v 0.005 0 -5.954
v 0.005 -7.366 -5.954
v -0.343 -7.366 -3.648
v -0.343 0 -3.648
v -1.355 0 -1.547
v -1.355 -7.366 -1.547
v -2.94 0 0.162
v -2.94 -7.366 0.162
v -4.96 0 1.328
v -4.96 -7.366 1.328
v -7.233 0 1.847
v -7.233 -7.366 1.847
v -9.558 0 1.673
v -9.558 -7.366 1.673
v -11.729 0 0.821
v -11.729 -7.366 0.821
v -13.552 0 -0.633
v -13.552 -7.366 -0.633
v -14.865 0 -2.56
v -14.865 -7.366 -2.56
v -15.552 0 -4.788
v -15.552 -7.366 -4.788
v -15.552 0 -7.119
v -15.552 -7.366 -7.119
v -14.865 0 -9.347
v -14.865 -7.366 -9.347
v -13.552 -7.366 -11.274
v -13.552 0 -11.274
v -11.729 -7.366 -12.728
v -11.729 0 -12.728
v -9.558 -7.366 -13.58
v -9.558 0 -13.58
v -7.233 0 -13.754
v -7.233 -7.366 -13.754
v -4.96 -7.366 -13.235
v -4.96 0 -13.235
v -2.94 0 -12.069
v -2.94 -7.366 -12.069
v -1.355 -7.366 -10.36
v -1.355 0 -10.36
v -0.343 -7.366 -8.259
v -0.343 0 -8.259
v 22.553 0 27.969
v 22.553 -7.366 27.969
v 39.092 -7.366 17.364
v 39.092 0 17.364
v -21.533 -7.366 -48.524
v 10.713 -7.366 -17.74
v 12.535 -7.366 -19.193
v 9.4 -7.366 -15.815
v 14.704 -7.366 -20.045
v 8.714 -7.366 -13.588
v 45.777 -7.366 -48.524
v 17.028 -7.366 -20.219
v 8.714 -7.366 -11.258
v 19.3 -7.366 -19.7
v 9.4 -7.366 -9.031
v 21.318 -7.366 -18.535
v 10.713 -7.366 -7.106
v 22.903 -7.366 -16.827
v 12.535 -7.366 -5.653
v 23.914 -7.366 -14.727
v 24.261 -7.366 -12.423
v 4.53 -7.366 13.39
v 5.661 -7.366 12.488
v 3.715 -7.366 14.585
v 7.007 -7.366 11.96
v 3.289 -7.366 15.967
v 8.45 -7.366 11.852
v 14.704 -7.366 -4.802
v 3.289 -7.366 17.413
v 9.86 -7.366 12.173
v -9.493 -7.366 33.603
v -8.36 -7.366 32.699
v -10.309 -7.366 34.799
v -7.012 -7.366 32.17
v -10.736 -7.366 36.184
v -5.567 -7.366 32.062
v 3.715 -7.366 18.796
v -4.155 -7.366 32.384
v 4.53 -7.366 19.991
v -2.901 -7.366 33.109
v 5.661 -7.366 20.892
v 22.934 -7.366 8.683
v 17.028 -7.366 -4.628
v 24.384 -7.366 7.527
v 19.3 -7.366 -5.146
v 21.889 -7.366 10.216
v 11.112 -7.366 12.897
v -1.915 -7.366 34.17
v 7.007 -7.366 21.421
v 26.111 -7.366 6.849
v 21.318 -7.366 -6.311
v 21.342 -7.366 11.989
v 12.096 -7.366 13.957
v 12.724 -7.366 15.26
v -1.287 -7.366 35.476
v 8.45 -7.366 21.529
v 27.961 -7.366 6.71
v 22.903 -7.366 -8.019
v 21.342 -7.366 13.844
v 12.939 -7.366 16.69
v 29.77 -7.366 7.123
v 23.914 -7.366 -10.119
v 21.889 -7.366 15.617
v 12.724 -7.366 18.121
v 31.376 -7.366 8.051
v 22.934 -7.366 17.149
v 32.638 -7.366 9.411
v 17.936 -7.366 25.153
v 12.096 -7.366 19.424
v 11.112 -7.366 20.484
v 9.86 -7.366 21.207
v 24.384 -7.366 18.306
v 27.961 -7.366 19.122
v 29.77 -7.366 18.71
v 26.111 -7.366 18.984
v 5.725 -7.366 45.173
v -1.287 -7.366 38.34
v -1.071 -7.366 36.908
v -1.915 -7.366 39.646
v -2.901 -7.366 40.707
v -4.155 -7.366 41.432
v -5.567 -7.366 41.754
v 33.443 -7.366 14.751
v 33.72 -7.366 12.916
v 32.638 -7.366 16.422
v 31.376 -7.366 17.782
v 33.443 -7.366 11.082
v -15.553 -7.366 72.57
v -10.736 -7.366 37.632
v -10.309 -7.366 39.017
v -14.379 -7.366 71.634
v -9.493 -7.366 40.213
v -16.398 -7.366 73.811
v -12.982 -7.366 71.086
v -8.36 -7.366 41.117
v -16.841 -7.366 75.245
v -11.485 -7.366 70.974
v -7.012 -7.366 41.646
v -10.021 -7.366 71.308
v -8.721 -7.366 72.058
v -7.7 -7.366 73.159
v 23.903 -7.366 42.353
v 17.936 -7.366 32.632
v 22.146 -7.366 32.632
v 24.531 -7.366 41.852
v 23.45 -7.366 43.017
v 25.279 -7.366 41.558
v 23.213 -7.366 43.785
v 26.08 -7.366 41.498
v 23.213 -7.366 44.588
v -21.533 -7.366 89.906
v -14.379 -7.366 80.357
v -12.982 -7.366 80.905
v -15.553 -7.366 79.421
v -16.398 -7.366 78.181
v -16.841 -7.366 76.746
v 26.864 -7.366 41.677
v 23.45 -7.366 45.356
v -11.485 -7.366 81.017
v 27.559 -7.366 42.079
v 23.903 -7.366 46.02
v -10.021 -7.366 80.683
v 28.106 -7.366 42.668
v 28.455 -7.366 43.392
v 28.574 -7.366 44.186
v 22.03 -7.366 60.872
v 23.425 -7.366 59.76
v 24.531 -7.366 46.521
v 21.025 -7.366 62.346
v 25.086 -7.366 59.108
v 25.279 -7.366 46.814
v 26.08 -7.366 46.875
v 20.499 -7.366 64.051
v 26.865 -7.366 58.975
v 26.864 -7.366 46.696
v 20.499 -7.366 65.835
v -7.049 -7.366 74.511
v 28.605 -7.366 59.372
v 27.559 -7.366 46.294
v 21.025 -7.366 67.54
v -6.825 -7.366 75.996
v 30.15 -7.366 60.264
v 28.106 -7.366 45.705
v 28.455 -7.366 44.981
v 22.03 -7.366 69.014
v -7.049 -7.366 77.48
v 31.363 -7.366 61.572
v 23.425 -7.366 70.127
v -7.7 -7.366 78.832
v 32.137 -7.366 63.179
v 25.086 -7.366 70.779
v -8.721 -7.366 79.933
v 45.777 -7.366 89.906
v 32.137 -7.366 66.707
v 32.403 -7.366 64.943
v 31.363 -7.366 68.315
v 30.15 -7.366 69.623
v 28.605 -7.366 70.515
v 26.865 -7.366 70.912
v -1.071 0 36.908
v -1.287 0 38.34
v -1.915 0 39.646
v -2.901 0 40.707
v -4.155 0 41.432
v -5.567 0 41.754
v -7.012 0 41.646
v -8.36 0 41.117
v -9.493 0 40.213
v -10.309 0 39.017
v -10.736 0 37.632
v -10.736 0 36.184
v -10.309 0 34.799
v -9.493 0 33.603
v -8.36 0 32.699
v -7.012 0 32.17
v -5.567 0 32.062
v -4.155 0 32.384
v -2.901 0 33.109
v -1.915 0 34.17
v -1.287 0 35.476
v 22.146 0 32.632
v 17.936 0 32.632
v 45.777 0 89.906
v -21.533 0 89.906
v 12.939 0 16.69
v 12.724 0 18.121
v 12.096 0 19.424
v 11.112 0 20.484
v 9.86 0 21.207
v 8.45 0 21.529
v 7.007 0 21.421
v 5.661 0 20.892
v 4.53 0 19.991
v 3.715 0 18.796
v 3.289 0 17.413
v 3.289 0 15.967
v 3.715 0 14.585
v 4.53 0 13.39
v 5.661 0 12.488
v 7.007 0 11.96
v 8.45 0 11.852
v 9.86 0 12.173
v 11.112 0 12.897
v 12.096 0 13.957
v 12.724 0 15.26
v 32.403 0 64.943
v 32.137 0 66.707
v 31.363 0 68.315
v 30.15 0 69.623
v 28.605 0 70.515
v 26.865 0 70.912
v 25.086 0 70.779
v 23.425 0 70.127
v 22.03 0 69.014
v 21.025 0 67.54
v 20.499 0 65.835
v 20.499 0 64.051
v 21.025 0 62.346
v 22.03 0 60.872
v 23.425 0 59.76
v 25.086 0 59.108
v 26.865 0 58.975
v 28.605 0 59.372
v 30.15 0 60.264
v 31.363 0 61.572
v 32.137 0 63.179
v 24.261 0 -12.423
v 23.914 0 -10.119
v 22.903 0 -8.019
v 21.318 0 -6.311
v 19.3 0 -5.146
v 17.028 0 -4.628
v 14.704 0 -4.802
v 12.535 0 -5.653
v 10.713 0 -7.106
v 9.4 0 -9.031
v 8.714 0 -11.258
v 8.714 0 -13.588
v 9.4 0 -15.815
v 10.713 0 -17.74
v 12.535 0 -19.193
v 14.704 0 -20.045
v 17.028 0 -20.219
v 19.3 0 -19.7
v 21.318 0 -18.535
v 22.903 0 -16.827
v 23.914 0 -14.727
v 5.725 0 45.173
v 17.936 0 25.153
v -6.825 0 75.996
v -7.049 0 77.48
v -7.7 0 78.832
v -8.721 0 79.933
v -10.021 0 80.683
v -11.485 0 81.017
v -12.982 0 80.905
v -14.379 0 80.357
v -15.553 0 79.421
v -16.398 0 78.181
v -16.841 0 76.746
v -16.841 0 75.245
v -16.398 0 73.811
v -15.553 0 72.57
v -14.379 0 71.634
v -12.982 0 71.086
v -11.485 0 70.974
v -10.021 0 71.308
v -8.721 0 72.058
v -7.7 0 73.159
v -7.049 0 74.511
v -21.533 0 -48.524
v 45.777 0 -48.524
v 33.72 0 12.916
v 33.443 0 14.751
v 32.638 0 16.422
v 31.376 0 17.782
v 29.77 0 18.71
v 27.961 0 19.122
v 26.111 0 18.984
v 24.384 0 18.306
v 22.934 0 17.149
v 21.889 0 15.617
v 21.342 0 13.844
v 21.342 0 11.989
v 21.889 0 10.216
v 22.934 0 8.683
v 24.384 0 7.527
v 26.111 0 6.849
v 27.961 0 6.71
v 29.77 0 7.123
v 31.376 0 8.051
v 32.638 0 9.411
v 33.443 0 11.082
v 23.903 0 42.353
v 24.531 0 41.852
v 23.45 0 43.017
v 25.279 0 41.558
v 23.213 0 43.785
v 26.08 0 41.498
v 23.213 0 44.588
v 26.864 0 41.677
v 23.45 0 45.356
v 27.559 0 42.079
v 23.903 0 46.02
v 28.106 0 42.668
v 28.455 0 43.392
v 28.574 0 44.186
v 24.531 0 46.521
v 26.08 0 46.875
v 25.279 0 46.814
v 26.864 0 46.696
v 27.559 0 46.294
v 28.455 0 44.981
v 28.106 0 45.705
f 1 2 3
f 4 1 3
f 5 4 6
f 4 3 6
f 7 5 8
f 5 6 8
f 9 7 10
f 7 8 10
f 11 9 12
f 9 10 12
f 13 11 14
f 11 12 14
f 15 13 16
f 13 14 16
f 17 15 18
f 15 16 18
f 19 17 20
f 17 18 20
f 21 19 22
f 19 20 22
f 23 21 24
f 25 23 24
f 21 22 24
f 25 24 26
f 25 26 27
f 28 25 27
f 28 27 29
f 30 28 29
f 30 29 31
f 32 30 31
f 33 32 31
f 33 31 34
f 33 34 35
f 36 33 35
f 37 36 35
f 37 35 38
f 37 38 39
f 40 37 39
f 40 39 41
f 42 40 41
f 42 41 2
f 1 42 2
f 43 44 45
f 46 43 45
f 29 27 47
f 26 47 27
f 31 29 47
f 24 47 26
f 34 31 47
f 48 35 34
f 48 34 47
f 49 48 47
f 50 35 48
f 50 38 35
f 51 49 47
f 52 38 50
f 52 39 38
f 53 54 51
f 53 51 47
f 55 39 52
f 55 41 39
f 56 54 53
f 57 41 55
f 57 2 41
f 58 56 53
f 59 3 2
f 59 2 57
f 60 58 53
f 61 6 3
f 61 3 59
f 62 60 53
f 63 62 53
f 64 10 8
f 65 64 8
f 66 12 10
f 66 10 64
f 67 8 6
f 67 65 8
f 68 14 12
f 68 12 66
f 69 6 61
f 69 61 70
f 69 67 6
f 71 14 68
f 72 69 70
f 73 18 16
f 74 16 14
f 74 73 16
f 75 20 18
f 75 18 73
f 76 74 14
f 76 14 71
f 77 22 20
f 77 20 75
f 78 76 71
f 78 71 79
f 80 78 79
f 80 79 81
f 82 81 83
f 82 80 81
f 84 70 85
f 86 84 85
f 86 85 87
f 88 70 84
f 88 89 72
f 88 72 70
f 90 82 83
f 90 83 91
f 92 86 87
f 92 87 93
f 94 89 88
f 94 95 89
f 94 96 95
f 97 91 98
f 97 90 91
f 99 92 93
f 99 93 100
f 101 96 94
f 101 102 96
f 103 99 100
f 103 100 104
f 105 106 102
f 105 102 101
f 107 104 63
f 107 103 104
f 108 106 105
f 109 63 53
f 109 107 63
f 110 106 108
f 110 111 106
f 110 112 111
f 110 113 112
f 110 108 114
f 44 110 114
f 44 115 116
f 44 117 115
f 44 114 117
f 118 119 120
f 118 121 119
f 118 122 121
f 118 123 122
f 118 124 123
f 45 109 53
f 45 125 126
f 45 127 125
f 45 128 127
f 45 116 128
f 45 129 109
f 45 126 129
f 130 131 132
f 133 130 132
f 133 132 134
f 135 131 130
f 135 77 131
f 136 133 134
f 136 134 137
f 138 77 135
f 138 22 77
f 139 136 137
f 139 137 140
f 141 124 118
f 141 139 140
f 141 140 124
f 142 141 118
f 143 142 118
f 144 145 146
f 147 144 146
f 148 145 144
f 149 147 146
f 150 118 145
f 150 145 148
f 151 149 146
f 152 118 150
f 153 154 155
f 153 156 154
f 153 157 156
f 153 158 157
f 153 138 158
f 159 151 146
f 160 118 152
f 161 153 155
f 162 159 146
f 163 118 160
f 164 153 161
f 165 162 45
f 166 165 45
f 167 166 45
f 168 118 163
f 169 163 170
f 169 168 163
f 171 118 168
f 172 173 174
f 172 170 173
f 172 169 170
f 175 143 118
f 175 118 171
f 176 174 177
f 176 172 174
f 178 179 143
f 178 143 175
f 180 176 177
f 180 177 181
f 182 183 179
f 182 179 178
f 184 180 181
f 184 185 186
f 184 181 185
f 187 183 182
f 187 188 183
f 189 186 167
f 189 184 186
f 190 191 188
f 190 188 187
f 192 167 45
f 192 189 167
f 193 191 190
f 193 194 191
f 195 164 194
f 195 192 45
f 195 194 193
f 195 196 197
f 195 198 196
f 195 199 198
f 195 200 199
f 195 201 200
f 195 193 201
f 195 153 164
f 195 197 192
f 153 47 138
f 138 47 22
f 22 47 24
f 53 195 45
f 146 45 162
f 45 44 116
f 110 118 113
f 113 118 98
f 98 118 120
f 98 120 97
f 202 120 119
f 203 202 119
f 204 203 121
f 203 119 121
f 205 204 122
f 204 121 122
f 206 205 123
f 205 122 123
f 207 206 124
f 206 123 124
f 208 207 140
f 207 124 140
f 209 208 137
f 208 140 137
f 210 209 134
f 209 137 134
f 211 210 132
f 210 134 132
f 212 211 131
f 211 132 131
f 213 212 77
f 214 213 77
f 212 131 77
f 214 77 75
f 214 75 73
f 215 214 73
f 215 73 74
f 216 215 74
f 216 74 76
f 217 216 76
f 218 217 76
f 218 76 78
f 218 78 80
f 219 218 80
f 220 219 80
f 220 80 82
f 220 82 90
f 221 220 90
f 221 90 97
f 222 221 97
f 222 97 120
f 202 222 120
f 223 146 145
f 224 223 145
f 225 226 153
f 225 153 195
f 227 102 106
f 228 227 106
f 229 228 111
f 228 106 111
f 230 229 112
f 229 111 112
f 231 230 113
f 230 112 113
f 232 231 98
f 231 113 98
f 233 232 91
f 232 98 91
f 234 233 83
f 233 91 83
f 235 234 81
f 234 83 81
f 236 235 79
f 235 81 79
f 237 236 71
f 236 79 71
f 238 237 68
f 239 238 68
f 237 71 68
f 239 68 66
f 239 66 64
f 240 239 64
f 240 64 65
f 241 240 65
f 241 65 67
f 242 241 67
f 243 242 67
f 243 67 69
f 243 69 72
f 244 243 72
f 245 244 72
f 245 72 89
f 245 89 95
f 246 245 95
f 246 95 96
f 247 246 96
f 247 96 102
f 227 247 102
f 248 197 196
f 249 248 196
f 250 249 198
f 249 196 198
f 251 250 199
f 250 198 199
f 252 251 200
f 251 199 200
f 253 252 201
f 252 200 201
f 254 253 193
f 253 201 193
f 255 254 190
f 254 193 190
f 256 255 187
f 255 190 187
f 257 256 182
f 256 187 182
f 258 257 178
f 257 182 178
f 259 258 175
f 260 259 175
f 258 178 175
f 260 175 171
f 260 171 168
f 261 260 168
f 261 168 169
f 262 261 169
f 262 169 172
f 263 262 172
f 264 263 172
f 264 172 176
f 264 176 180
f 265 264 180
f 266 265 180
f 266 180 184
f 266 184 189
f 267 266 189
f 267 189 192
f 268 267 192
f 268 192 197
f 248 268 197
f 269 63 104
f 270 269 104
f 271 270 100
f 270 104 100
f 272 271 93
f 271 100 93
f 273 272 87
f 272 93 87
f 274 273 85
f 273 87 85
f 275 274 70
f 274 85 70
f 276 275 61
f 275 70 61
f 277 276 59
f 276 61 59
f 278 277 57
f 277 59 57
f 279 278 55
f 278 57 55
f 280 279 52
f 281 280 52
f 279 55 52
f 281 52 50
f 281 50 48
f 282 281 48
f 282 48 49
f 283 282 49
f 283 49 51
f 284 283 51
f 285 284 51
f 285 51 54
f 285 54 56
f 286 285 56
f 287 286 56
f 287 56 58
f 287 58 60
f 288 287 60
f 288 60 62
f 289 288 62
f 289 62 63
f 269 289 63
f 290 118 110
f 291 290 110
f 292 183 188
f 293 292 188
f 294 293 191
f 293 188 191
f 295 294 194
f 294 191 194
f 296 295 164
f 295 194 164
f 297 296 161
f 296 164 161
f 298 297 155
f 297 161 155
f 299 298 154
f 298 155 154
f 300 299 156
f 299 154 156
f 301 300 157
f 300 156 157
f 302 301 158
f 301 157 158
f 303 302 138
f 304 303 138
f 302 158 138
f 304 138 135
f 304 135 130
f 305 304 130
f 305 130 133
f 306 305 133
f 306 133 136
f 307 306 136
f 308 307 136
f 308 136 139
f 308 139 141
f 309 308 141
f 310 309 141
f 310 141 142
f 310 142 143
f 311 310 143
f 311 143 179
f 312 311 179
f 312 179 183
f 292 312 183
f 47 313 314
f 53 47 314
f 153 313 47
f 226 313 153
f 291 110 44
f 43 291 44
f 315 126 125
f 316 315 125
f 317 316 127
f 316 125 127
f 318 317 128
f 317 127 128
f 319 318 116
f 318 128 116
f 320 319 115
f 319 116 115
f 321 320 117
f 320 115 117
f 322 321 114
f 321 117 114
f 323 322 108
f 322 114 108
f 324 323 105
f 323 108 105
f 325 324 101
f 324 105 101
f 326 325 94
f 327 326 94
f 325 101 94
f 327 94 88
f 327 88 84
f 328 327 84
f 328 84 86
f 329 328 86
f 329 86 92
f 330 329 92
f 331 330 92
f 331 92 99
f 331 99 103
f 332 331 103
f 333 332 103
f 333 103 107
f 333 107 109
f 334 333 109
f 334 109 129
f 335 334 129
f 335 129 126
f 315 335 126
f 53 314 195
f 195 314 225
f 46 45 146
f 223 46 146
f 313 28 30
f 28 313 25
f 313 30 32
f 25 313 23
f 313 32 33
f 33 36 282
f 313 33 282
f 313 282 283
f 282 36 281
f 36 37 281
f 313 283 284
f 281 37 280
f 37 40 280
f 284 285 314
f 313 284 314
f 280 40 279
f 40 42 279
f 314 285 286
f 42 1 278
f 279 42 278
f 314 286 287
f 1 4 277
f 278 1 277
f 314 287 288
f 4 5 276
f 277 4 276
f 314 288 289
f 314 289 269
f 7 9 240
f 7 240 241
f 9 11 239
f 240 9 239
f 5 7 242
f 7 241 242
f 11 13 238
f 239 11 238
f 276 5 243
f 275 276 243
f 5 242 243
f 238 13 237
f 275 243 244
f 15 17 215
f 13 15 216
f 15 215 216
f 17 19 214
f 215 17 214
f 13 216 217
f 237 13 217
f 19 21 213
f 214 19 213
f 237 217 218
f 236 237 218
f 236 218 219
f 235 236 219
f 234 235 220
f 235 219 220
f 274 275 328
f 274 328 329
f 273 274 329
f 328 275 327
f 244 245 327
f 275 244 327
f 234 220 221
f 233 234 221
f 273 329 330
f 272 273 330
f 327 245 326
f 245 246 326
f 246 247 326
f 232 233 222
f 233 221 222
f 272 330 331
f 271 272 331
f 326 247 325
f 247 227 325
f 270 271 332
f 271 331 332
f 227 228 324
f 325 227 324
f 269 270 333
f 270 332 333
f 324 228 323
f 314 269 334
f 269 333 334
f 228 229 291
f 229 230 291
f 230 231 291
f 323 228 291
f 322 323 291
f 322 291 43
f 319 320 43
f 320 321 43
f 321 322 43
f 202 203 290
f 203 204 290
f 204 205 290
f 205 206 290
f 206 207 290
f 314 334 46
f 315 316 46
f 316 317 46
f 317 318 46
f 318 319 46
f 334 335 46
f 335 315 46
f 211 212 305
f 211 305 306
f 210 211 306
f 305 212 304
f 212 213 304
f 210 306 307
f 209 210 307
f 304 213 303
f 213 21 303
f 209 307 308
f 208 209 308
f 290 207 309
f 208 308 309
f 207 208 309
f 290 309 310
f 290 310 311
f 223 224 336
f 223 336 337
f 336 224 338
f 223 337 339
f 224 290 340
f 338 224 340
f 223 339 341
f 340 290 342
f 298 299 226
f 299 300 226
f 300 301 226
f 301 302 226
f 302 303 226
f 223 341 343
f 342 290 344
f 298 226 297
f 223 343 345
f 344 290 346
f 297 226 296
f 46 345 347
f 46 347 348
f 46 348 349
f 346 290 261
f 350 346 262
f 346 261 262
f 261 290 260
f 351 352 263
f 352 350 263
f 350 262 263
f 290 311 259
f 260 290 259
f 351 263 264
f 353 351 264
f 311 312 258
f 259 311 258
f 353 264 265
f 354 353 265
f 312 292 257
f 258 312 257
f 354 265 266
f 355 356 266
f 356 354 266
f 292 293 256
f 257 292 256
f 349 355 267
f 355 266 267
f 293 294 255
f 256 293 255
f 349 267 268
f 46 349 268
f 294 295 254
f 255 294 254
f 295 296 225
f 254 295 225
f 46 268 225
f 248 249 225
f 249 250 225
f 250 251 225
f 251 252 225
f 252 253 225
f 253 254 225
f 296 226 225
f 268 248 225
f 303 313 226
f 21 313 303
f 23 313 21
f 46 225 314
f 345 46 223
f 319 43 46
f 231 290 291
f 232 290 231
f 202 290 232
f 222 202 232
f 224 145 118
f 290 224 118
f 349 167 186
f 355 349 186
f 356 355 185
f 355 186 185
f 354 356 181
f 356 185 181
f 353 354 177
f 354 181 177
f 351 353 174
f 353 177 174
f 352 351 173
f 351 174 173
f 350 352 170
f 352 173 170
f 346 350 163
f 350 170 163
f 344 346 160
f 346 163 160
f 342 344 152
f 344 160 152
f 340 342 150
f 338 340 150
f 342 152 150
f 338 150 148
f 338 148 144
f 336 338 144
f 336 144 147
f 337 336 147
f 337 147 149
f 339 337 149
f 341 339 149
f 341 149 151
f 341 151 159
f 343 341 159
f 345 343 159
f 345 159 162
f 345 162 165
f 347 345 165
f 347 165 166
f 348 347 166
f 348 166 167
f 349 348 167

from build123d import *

# Parameters (mm, degrees)
F0_W     = 67.31
F0_H     = 138.43
F1_DEPTH = 7.366
F2_R     = 5.985409
F2_R_2   = 5.035969
F2_R_3   = 4.859729
F2_R_4   = 4.852246
F2_R_5   = 6.223489
F2_R_6   = 7.822156
F2_R_7   = 7.817507
F2_R_8   = 2.695695
F3_DEPTH = 25.4
F5_DEPTH = 25.4


with BuildPart() as f1:
    # F0 (on Front) → F1 (new body)
    with BuildSketch(Plane.XZ):
        with Locations((12.122316, 20.691026)):
            Rectangle(F0_W, F0_H)
    extrude(amount=F1_DEPTH)

    # F2 (on face) → F3 (cut)
    with BuildSketch(Plane.XZ.offset(7.366)):
        with Locations((26.417792, 64.943209)):
            Circle(F2_R)
        with Locations((-11.861048, 75.99555)):
            Circle(F2_R_2)
        with Locations((-5.930525, 36.908004)):
            Circle(F2_R_3)
        with Locations((8.087078, 16.690306)):
            Circle(F2_R_4)
        with Locations((27.496068, 12.916337)):
            Circle(F2_R_5)
        with Locations((-7.81751, -5.953513)):
            Circle(F2_R_6)
        with Locations((16.443726, -12.423175)):
            Circle(F2_R_7)
        with Locations((25.878653, 44.186372)):
            Circle(F2_R_8)
    extrude(amount=-F3_DEPTH, mode=Mode.SUBTRACT)

    # F4 (on face) → F5 (cut)
    with BuildSketch(Plane.XZ.offset(7.366)):
        Polygon((17.936366, 32.632034), (5.725363, 45.173392), (17.936366, 25.152631), (22.55336, 27.968614), (39.092198, 17.363565), (22.145992, 32.632034), align=None)
    extrude(amount=-F5_DEPTH, mode=Mode.SUBTRACT)


solid = f1.part
